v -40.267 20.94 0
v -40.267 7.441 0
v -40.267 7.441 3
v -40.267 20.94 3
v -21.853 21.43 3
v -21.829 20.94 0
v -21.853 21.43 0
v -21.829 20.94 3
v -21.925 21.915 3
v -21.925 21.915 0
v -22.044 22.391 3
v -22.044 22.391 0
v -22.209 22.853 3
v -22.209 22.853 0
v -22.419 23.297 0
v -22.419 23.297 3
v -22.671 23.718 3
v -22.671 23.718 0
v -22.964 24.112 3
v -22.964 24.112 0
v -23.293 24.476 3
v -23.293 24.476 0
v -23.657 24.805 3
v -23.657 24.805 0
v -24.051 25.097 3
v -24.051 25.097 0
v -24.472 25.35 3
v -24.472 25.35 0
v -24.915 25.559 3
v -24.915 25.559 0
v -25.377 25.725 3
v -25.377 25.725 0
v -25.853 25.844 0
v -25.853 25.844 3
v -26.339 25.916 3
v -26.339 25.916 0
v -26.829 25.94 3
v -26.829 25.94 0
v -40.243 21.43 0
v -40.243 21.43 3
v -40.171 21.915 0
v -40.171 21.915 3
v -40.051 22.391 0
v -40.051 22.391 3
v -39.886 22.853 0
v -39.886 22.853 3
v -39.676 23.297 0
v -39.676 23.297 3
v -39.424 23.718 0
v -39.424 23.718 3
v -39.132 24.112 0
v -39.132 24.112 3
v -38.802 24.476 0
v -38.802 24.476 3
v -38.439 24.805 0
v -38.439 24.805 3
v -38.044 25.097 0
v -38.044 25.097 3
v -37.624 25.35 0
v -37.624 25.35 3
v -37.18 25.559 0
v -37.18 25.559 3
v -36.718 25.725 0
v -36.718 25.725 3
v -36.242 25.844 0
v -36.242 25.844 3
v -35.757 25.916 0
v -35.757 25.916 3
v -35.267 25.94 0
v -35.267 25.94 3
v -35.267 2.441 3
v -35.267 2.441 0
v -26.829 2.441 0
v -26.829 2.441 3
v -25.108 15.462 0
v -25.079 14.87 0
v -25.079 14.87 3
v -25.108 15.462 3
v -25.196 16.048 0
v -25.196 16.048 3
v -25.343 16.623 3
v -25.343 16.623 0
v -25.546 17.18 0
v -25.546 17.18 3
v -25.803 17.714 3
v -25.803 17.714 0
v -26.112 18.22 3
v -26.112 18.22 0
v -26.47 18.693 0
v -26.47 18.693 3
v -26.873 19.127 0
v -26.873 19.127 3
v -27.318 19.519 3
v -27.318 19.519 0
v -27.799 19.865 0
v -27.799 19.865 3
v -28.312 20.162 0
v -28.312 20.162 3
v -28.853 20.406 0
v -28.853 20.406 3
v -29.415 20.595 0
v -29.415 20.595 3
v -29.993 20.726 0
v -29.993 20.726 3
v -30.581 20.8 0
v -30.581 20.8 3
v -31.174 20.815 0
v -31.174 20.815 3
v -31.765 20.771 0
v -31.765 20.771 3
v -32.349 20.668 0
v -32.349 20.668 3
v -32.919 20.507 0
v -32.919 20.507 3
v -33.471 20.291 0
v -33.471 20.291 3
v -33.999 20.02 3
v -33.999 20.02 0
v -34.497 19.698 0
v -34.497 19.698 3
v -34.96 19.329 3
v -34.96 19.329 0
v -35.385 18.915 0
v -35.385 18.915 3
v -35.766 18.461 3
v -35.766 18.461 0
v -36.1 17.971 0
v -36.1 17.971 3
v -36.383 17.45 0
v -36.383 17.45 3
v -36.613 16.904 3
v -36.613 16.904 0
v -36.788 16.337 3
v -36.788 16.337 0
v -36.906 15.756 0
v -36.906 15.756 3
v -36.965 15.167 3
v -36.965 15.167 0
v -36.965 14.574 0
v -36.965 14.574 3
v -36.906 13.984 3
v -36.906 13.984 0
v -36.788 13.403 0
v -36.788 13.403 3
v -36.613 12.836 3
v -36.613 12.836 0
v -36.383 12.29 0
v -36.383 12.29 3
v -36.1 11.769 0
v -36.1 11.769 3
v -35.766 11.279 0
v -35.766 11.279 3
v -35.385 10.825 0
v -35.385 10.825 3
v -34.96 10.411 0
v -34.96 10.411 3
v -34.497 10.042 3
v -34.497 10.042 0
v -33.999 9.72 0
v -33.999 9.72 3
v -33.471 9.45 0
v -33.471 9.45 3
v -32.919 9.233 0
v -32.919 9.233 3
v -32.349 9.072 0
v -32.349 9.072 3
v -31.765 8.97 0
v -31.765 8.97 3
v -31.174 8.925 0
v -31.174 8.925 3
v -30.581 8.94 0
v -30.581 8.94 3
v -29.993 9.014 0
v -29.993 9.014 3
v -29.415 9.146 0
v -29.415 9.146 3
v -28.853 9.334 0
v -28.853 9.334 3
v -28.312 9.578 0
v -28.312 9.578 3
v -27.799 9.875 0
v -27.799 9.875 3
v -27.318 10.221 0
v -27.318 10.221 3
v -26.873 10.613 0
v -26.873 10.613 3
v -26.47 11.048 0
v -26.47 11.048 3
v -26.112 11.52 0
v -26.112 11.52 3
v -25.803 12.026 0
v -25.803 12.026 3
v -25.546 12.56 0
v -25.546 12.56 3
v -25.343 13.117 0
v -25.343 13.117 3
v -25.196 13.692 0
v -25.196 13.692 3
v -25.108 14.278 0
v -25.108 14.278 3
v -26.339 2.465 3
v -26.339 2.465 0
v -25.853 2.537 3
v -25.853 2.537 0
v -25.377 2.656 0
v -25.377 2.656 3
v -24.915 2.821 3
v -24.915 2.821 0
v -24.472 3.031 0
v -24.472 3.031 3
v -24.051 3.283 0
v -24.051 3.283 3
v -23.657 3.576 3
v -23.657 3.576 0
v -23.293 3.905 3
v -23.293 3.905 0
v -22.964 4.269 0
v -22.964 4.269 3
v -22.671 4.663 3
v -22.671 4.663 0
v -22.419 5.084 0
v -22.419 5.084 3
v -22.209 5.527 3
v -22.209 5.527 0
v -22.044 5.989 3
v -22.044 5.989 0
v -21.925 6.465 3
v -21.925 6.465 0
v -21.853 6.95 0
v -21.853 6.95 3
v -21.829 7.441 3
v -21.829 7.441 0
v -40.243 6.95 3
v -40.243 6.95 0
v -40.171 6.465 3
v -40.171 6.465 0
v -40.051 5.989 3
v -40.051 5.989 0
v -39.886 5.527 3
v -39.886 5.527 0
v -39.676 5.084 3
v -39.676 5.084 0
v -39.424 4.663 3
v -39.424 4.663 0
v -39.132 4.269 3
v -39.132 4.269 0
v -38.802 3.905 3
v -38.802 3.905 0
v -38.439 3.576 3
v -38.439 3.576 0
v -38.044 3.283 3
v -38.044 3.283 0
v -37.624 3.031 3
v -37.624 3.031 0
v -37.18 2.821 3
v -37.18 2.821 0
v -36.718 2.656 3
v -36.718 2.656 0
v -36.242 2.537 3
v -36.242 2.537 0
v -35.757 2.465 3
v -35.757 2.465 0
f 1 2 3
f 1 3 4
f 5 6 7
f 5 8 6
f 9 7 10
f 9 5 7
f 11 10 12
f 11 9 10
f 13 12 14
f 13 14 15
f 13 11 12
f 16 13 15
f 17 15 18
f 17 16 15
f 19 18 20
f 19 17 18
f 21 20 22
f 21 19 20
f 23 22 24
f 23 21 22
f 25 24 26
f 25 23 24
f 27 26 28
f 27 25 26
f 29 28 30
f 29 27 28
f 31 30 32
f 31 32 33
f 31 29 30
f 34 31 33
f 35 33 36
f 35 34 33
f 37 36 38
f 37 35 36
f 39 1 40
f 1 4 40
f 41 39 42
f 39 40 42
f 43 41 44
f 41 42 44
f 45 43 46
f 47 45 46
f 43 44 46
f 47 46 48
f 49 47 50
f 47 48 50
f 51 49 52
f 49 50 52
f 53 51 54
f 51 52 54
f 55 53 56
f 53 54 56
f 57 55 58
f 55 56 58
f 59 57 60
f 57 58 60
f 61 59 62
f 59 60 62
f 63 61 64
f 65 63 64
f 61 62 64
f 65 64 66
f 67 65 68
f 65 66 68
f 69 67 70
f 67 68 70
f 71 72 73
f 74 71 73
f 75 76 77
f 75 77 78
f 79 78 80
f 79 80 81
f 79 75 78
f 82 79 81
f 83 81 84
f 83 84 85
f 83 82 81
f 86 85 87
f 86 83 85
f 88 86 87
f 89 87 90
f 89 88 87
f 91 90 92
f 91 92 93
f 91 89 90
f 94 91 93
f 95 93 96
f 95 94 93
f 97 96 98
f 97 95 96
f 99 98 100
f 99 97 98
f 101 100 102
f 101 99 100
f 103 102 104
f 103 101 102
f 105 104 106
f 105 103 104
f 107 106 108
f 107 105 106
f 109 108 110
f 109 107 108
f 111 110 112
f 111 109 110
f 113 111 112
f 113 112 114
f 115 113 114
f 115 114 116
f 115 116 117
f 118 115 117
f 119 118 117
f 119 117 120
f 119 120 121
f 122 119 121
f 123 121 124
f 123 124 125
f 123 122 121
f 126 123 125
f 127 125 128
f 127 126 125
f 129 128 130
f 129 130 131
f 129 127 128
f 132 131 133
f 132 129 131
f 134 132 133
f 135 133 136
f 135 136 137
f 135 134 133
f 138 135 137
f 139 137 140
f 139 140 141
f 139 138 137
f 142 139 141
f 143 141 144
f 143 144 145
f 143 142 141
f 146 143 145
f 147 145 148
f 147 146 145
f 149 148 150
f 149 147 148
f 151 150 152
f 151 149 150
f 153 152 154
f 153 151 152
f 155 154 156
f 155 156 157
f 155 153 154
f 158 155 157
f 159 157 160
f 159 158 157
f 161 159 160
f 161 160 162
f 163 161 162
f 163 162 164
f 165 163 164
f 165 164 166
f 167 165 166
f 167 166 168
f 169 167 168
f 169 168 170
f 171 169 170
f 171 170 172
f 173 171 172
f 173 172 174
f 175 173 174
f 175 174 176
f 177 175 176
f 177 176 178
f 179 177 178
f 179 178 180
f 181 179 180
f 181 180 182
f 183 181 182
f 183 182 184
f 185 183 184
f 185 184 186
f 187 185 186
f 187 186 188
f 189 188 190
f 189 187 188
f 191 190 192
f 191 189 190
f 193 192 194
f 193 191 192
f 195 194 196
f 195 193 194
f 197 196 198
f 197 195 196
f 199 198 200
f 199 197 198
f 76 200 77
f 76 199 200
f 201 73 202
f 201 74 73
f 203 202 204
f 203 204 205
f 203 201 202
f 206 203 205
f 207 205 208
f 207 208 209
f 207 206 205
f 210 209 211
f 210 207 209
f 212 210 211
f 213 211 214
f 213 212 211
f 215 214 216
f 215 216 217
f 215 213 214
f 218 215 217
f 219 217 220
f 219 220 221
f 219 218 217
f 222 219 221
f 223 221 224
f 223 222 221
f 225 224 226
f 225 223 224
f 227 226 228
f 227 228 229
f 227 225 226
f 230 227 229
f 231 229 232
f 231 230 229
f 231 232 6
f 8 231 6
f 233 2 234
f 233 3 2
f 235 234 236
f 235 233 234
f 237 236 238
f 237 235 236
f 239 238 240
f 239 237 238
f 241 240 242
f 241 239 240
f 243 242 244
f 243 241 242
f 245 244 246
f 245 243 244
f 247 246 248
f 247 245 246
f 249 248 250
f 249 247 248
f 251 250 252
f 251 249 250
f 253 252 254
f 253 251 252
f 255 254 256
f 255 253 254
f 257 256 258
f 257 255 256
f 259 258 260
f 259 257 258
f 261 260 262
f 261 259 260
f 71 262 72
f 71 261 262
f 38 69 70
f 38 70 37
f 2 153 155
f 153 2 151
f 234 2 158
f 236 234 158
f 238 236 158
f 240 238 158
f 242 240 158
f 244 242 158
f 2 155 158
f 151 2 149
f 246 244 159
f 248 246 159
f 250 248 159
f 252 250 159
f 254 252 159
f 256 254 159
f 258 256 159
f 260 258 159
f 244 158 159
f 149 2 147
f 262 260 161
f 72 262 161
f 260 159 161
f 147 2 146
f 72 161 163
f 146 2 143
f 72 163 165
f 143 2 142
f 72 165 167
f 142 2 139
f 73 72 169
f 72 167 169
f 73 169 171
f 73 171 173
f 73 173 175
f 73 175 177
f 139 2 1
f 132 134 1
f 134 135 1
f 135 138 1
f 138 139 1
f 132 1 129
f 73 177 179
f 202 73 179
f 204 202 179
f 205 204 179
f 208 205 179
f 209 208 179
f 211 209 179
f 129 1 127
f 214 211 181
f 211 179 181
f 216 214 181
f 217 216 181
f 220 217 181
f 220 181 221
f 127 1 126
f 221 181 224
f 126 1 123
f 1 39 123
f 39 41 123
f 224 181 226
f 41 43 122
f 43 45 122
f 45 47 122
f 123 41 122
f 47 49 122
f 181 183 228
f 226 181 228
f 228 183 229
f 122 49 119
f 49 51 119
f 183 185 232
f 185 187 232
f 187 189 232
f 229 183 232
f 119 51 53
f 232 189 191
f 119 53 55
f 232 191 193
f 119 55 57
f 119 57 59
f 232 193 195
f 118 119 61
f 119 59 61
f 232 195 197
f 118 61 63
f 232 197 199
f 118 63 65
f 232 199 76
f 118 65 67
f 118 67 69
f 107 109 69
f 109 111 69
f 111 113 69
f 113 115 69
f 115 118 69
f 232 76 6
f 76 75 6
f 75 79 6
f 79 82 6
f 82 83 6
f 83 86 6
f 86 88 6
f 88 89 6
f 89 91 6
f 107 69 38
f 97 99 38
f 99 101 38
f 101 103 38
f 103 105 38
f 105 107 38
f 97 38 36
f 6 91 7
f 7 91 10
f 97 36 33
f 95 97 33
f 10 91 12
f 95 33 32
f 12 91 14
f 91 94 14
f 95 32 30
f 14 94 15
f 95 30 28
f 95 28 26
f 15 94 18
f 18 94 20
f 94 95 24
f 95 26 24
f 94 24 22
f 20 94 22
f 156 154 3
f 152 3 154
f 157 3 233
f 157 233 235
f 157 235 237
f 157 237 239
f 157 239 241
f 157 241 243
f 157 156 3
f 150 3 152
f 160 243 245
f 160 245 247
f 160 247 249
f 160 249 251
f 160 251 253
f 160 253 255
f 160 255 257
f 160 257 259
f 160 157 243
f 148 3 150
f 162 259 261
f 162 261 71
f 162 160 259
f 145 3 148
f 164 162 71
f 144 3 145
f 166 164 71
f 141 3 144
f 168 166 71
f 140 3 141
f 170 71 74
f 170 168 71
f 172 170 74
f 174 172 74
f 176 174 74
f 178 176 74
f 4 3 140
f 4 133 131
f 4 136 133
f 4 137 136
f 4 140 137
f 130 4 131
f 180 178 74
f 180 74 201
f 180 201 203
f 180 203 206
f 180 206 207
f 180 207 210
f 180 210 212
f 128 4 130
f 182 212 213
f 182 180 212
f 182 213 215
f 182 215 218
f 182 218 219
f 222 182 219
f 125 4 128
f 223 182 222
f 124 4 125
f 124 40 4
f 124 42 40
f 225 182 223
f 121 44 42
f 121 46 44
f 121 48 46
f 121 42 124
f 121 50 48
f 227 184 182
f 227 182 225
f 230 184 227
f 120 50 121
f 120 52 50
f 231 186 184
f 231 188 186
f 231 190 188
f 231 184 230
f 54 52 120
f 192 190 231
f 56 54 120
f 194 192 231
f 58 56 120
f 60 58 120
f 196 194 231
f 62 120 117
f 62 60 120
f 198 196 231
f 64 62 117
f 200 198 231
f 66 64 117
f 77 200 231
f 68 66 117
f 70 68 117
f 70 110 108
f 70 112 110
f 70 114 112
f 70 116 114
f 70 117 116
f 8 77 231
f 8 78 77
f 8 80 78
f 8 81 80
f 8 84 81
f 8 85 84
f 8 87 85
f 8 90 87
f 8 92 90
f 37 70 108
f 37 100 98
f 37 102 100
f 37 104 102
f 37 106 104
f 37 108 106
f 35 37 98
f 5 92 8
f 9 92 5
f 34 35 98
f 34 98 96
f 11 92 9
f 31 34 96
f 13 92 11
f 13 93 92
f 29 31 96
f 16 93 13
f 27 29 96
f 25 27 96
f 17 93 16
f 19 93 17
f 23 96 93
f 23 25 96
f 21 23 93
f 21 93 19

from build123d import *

# Parameters (mm, degrees)
F0_W     = 18.437991
F0_H     = 23.499398
F1_DEPTH = 3
F2_R     = 5
F3_R     = 5.946715
F4_DEPTH = 3


with BuildPart() as f1:
    # F0 (on Top) → F1 (new body)
    with BuildSketch(Plane.XY):
        with Locations((-31.047585, 14.190282)):
            Rectangle(F0_W, F0_H)
    extrude(amount=F1_DEPTH)

    # F2
    f2_edges = [f1.edges().sort_by_distance(p)[0] for p in [
        (-40.266581, 25.939981, 1.5),
        (-21.82859, 25.939981, 1.5),
        (-21.82859, 2.440583, 1.5),
        (-40.266581, 2.440583, 1.5),
    ]]
    fillet(f2_edges, radius=F2_R)

    # F3 (on Top) → F4 (cut)
    with BuildSketch(Plane.XY):
        with Locations((-31.025298, 14.870087)):
            Circle(F3_R)
    extrude(amount=F4_DEPTH, mode=Mode.SUBTRACT)


solid = f1.part
